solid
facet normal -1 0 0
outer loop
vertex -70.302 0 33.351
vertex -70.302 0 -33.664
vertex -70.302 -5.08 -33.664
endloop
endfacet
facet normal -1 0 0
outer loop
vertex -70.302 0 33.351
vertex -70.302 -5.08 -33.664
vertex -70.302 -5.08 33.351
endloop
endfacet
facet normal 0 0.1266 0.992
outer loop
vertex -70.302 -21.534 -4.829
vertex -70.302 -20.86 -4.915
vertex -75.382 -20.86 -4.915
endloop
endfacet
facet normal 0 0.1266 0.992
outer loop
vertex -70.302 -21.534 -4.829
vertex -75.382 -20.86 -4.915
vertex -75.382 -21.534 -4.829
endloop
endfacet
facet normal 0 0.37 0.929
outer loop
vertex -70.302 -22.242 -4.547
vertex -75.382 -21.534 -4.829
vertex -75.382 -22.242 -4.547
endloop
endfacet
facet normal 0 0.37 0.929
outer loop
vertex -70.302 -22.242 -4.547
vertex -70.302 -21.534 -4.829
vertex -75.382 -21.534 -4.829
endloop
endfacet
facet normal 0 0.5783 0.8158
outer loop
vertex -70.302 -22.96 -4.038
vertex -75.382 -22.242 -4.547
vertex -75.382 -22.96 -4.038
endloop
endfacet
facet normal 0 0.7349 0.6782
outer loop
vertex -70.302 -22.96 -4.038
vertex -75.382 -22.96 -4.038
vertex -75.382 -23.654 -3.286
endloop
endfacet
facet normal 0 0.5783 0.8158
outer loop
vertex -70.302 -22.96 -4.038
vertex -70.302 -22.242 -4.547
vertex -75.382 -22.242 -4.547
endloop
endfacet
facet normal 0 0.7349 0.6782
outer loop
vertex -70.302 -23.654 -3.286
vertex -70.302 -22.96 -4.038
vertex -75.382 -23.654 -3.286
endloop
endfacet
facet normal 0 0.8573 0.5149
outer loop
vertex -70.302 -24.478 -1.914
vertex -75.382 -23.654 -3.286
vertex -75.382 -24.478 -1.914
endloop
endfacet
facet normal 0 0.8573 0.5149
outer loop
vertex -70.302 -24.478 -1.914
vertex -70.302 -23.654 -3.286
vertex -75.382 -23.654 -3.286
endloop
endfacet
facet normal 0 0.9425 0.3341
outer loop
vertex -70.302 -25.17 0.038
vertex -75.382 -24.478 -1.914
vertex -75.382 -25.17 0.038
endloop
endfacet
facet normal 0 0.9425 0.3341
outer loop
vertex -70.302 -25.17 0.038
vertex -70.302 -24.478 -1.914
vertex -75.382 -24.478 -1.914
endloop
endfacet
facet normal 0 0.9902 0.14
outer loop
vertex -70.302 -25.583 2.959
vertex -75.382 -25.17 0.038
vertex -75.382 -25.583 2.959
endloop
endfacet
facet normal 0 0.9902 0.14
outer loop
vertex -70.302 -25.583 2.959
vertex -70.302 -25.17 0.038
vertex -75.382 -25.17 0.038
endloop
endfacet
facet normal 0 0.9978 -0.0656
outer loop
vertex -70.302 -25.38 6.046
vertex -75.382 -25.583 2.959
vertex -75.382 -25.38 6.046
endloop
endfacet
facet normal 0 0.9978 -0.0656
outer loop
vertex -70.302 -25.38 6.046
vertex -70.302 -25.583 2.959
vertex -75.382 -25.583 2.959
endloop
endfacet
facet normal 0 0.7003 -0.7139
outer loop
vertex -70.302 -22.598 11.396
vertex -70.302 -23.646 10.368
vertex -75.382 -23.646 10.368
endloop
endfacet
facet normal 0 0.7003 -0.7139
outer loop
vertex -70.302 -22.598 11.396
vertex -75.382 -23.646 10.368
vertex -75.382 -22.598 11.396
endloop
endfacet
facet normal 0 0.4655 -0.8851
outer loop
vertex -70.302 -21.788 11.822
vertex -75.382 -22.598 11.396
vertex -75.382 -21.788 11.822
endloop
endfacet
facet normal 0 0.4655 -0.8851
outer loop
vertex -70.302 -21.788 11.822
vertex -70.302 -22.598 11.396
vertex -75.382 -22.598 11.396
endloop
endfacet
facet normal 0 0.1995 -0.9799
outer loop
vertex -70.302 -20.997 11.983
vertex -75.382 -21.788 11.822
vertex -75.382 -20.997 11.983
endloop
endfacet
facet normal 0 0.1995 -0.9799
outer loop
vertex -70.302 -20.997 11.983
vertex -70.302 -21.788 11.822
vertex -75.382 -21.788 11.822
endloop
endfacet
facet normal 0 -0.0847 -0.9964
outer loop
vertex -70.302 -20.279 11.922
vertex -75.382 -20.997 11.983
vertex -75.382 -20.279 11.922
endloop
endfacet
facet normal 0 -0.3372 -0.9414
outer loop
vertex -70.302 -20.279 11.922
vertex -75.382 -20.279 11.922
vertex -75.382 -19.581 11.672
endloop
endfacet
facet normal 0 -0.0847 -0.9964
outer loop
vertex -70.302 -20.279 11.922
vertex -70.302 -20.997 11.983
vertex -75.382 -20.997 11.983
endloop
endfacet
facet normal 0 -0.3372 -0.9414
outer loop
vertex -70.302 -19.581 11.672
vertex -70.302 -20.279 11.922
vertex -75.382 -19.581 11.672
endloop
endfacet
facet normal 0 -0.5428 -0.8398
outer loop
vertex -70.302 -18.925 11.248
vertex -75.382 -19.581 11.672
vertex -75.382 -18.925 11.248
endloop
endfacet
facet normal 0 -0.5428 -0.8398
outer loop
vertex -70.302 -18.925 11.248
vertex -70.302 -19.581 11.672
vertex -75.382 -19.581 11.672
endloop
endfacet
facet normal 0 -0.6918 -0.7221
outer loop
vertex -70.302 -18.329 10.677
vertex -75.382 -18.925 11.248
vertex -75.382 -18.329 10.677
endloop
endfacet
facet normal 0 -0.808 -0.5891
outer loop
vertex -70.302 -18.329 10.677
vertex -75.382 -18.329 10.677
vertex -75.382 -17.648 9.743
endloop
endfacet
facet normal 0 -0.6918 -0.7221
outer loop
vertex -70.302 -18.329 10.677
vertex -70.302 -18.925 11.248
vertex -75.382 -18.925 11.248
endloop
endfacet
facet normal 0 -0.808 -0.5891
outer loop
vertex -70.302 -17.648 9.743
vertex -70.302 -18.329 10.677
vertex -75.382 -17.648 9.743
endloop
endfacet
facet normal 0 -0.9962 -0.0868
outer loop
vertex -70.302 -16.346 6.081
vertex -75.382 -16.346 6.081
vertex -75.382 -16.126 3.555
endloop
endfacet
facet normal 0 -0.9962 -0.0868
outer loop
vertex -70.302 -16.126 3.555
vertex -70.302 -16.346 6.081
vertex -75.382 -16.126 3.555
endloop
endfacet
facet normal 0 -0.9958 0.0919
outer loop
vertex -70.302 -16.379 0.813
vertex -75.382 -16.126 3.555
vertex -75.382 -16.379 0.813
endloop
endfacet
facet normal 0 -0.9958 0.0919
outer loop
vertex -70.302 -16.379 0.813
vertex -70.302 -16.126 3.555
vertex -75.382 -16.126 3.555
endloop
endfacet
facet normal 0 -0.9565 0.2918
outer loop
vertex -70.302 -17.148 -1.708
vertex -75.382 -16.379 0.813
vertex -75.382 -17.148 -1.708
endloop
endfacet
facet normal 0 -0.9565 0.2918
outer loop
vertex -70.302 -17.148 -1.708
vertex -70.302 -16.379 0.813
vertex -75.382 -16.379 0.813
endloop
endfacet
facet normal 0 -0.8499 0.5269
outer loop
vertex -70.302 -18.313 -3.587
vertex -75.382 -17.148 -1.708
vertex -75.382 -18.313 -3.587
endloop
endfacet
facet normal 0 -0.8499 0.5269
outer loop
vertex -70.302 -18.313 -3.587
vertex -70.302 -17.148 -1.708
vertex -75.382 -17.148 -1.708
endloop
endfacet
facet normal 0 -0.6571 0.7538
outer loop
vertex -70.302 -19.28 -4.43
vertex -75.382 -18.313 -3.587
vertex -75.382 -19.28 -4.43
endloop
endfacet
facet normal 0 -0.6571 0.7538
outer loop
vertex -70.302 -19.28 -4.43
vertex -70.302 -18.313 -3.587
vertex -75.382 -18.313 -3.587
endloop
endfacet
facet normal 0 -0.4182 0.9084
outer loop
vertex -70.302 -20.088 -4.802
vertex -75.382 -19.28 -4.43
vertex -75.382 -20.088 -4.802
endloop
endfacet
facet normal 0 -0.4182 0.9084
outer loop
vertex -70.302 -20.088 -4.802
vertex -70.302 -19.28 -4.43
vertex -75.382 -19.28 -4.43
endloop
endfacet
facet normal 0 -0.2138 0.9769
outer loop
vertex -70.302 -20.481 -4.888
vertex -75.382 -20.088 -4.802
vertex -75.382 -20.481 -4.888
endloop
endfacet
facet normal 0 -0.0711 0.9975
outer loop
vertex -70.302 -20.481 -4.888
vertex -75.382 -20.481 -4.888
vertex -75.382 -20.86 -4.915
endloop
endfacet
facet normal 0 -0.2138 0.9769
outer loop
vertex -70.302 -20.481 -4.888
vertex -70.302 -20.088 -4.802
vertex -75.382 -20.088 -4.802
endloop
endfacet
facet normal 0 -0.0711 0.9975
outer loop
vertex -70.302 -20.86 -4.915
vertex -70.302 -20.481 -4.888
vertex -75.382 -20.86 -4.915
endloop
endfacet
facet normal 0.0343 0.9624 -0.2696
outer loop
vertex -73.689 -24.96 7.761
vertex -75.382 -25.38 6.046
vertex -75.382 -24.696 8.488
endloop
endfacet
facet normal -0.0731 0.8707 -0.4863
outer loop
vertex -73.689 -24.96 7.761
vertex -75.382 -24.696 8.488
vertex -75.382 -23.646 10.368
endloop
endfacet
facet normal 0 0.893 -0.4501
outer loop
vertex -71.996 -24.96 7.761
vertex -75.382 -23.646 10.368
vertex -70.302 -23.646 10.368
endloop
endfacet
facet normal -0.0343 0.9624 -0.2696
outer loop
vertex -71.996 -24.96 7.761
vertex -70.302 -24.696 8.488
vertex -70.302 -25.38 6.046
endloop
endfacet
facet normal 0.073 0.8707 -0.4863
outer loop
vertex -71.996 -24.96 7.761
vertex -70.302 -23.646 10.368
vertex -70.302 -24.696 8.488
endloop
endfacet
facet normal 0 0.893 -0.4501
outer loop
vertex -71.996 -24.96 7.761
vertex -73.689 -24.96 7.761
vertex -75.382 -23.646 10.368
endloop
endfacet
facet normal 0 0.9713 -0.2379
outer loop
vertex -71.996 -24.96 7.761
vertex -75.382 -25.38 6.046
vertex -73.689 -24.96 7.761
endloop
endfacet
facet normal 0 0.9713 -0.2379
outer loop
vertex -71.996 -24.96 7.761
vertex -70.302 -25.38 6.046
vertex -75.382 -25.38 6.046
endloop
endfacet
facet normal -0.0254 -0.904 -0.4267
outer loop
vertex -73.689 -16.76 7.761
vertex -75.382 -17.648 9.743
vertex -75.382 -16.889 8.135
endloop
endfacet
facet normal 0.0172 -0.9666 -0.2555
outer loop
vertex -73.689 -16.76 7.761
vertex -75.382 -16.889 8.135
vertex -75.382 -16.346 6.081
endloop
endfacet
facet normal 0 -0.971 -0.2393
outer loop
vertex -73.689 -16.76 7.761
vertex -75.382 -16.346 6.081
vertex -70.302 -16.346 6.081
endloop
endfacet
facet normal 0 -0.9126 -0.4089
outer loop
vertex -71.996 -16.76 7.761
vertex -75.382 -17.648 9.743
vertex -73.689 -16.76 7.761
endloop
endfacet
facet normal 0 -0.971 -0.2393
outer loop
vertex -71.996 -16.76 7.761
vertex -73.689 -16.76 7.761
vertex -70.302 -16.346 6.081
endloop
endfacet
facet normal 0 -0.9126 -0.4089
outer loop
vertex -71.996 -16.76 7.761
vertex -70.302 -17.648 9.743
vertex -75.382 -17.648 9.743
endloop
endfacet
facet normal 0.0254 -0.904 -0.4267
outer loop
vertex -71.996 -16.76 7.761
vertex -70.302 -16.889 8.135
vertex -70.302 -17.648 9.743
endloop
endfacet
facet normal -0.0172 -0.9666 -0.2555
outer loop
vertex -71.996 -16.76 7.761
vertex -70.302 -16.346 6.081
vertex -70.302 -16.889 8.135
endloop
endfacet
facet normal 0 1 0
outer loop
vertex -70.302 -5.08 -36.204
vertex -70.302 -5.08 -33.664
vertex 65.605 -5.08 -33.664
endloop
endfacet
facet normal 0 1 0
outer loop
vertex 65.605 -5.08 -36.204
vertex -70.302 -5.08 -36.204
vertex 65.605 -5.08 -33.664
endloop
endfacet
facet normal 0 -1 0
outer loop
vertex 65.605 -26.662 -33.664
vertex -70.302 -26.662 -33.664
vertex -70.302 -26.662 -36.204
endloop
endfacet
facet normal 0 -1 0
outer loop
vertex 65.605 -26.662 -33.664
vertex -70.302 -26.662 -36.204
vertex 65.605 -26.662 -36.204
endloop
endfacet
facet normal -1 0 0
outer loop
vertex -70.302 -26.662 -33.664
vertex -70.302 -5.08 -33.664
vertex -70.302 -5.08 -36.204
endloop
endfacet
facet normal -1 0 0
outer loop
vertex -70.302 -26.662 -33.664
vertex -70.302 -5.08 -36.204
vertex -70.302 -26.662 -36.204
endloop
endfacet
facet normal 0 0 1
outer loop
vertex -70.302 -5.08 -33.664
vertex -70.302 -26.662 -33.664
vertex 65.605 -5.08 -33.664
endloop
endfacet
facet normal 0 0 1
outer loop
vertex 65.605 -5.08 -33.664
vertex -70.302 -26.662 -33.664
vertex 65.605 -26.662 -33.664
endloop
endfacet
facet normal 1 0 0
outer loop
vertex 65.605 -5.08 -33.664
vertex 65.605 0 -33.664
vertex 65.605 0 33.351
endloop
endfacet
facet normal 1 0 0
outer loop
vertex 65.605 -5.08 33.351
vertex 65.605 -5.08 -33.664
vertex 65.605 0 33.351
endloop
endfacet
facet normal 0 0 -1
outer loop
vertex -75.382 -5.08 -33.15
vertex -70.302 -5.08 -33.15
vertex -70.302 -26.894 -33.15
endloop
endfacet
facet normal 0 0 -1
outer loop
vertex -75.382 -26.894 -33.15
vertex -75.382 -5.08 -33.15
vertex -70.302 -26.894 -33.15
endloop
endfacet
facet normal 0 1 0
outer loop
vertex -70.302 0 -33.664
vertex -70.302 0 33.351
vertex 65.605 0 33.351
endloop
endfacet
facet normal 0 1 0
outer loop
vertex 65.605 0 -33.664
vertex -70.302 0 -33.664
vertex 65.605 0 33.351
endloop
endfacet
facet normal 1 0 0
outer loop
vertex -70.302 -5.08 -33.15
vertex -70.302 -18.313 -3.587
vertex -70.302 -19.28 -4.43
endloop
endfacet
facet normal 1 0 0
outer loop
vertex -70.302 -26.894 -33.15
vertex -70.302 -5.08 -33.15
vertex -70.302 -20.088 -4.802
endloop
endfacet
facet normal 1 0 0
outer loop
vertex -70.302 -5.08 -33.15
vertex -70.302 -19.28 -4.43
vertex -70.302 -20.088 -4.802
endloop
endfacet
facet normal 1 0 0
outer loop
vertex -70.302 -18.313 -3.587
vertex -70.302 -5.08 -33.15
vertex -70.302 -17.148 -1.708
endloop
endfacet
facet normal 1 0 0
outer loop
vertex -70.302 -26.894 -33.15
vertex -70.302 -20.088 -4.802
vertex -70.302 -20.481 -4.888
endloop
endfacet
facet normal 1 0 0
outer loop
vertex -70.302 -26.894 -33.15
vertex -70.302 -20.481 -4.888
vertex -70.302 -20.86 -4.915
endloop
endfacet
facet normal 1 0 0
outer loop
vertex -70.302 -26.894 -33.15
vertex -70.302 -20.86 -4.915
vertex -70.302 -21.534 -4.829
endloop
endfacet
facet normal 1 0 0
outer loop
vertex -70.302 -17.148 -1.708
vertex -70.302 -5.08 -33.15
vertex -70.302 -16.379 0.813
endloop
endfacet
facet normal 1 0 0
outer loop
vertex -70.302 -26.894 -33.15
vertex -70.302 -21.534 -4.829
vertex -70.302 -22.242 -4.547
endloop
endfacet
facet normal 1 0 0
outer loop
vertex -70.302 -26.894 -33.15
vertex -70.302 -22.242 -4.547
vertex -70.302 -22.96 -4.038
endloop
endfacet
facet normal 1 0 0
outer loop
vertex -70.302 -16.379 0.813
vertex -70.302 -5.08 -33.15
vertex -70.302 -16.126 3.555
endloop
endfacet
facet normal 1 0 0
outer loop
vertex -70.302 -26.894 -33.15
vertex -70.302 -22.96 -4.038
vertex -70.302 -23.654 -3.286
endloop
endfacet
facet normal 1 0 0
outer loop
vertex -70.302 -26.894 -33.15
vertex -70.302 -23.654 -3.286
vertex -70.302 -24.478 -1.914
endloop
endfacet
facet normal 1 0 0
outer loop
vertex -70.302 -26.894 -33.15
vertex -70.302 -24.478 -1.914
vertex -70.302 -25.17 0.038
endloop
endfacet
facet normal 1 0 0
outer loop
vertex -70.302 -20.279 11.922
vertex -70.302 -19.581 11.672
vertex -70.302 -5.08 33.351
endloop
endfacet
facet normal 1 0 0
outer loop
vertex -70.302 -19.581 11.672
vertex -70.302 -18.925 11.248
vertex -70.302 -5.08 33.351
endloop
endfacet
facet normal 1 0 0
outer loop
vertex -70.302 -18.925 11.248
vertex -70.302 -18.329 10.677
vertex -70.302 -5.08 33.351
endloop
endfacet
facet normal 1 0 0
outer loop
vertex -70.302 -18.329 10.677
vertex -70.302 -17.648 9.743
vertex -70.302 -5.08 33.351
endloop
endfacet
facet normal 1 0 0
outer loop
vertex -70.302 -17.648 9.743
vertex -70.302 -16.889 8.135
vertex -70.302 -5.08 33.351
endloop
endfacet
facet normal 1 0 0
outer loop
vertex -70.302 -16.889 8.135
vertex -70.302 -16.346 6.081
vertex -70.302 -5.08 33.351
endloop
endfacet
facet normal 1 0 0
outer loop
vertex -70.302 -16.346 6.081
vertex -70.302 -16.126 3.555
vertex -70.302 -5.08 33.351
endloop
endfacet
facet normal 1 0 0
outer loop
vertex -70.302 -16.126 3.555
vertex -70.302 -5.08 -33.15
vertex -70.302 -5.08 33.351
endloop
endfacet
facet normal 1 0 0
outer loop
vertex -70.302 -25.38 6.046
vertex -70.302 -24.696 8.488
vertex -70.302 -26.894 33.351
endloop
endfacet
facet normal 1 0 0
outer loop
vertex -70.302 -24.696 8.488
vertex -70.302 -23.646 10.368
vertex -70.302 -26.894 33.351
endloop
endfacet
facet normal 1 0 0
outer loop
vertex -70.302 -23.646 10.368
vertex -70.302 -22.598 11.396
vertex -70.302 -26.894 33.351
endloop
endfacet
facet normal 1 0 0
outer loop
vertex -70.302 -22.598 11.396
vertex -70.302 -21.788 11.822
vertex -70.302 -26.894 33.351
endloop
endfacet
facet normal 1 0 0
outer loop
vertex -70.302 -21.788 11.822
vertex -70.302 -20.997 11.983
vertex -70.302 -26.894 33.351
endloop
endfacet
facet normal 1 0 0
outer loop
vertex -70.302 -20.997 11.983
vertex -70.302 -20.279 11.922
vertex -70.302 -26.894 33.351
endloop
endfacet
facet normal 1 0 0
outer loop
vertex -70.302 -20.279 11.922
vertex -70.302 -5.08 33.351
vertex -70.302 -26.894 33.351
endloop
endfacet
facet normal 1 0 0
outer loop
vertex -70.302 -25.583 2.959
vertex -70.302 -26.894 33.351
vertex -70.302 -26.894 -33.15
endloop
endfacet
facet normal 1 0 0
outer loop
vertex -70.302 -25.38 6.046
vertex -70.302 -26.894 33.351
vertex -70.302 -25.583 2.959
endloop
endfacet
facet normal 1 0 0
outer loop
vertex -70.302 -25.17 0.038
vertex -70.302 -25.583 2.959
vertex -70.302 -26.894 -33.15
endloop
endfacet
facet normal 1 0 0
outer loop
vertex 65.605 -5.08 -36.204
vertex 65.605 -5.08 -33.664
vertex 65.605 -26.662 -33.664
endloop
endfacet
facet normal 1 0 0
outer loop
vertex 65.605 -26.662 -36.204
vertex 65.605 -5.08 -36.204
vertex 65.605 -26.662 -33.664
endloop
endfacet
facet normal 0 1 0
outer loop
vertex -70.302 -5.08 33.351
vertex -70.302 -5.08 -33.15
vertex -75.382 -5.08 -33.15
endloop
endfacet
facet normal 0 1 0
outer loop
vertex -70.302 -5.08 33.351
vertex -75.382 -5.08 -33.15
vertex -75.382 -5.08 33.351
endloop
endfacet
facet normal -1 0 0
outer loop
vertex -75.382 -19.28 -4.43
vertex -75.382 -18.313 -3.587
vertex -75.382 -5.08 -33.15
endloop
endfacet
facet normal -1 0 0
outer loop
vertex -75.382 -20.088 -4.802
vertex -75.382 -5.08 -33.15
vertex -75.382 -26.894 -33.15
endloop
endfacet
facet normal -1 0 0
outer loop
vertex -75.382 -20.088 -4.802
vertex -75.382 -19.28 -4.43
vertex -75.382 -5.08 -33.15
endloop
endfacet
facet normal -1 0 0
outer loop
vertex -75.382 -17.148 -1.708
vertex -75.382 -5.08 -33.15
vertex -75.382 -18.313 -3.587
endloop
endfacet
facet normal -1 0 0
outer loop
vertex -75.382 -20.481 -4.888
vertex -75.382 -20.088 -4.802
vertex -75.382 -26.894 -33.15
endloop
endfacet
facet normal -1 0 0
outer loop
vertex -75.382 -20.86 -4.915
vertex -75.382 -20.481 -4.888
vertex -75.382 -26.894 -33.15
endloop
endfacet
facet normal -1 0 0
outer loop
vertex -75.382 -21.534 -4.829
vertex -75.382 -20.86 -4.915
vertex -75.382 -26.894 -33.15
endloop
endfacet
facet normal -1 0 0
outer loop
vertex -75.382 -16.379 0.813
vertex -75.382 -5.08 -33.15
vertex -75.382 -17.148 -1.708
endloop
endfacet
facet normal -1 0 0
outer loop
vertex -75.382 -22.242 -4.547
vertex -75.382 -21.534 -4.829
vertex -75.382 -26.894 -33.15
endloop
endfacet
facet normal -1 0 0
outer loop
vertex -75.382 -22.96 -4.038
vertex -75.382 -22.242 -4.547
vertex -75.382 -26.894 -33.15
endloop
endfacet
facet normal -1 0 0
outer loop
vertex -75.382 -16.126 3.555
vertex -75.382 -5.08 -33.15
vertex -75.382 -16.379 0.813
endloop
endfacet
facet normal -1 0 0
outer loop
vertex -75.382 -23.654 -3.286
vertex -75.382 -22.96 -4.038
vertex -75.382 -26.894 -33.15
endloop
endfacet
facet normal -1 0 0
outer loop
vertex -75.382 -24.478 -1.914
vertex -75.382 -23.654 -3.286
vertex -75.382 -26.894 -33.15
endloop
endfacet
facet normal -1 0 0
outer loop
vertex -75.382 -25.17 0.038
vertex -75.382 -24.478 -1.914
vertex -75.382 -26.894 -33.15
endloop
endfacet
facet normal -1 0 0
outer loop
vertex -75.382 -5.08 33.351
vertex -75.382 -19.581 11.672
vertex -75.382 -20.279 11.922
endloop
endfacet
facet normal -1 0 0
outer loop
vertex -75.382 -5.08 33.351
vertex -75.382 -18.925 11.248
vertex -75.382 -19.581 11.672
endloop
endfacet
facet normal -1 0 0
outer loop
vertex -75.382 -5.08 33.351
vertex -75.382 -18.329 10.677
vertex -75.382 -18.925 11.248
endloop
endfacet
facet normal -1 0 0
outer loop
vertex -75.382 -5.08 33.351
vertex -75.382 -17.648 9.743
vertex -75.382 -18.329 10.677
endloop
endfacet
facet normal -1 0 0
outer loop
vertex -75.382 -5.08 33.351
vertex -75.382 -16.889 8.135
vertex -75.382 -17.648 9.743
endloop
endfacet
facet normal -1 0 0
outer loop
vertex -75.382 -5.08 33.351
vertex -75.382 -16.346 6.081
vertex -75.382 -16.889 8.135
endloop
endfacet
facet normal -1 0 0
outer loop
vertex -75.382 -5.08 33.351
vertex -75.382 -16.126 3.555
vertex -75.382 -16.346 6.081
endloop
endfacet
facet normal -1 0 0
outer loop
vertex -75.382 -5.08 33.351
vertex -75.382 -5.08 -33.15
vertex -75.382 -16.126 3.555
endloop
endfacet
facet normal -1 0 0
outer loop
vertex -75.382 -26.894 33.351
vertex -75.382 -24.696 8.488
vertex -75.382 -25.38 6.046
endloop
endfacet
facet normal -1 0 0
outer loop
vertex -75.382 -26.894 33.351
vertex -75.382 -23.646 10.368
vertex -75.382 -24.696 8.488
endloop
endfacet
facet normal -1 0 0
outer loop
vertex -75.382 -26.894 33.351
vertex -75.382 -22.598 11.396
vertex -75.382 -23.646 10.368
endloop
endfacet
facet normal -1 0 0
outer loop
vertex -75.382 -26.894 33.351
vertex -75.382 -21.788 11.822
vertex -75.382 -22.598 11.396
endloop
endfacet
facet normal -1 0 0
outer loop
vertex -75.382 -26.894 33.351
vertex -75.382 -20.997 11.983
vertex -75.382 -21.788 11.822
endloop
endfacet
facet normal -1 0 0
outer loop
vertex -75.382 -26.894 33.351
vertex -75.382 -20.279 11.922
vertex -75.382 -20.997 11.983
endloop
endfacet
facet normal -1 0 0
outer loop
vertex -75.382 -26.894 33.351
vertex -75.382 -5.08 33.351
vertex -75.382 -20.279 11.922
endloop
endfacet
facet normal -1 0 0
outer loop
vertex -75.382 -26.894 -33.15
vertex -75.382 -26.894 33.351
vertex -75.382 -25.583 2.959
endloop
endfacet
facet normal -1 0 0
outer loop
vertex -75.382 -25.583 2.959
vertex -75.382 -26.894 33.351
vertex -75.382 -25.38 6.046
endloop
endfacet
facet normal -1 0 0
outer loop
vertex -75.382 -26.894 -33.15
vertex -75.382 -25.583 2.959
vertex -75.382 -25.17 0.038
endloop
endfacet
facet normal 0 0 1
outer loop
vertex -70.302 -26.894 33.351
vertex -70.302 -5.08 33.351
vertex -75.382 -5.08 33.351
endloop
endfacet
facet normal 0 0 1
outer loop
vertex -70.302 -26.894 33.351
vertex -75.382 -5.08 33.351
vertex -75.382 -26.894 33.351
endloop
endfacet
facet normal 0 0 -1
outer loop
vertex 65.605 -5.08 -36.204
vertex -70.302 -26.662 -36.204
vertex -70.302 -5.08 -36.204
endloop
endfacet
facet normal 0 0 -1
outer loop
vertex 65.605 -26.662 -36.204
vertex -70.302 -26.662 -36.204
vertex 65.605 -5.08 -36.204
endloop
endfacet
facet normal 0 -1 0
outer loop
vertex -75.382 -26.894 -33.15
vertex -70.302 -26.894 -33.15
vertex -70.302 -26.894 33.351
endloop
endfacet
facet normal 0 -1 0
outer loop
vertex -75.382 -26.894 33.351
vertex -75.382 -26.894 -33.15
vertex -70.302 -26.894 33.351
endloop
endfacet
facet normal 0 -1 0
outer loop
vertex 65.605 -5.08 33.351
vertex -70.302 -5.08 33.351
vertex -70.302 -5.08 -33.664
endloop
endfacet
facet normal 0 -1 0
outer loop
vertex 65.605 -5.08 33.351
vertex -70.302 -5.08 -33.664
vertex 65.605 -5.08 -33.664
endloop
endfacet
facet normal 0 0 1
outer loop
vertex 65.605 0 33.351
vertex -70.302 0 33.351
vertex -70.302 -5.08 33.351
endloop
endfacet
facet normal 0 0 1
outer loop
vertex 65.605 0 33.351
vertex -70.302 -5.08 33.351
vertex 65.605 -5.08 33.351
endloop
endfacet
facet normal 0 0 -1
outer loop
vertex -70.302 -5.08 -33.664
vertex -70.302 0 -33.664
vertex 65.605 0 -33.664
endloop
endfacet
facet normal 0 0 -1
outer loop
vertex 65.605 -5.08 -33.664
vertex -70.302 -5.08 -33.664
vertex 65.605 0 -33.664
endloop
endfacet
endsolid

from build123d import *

# Parameters (mm, degrees)
F0_W     = 135.9073966742
F0_H     = 67.0142434537
F1_DEPTH = 5.08
F2_W     = 21.8143142146
F2_H     = 66.5003098547
F3_DEPTH = 5.08
F5_W     = 135.9073966742
F5_H     = 21.5824521464
F6_DEPTH = 2.54


# Not quite as in the source:
# - the program builds the solid bodies; features that only make, move or delete a surface that nothing else refers to are left out


with BuildPart() as f1:
    # F0 (on Front) → F1 (new body)
    with BuildSketch(Plane.XZ):
        with Locations((-2.3486316204, -0.1565758139)):
            Rectangle(F0_W, F0_H)
    extrude(amount=F1_DEPTH)


with BuildPart() as f3:
    # F2 (on face) → F3 (new body)
    with BuildSketch(Plane(origin=(-70.3023299575, 0, 0), x_dir=(0, -1, 0), z_dir=(-1, 0, 0))):
        with Locations((15.9871571073, 0.1003909856)):
            Rectangle(F2_W, F2_H)
        with BuildLine():
            add(Edge.make_bspline(
                [(20.860183984, -4.9150027335), (29.0597432151, -4.9150027335), (24.9599635996, 7.7609560685), (20.860183984, 20.4369148705), (16.7604043685, 7.7609560685), (12.6606247529, -4.9150027335), (20.860183984, -4.9150027335)],
                knots=[0, 0, 0, 2.0943951024, 2.0943951024, 4.1887902048, 4.1887902048, 6.2831853072, 6.2831853072, 6.2831853072], degree=2, weights=[1, 0.5, 1, 0.5, 1, 0.5, 1]))
        make_face(mode=Mode.SUBTRACT)
    extrude(amount=F3_DEPTH)


with BuildPart() as f6:
    # F5 (on face) → F6 (new body)
    with BuildSketch(Plane(origin=(0, 0, -33.6636975408), x_dir=(1, 0, 0), z_dir=(0, 0, -1))):
        with Locations((-2.3486316204, 15.8712260732)):
            Rectangle(F5_W, F5_H)
    extrude(amount=F6_DEPTH)


solid = Compound([f1.part, f3.part, f6.part])
